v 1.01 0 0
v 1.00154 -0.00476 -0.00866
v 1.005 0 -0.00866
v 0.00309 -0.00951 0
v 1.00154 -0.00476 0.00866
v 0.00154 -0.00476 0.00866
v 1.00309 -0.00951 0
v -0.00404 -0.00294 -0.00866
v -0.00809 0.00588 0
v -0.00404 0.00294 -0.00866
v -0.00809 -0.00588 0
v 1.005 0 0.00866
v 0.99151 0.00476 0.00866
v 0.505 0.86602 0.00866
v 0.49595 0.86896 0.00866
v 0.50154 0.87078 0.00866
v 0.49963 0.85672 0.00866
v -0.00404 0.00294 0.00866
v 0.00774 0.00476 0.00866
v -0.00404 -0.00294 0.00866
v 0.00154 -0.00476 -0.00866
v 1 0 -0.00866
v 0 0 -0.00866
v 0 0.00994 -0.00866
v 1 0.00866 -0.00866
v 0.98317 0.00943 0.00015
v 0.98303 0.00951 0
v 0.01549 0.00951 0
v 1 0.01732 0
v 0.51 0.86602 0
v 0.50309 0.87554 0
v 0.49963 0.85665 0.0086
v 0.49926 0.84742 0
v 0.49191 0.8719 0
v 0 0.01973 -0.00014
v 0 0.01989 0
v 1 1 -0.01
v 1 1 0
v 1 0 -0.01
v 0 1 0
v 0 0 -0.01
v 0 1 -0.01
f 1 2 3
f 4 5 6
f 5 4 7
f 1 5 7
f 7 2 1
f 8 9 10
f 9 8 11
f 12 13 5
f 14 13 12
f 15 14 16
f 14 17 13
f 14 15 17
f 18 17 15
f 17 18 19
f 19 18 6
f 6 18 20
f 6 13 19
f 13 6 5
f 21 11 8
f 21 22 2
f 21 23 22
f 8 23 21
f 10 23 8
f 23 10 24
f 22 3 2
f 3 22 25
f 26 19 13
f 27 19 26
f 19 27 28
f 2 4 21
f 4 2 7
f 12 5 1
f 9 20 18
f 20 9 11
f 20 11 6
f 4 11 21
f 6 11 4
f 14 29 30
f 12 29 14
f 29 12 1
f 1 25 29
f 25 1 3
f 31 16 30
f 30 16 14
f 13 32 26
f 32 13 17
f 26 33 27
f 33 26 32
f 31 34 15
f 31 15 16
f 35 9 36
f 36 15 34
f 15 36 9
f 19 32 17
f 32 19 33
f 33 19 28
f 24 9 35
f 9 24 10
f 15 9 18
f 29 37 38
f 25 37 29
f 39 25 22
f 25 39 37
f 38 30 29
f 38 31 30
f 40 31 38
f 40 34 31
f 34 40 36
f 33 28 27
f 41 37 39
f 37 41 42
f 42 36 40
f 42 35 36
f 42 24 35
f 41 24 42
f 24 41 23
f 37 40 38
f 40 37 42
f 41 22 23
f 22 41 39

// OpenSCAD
hull(){
    translate([0.0, 0.0]) sphere(0.01);
    translate([1.0, 0.0]) sphere(0.01);
}
hull(){
    translate([1.0, 0.0]) sphere(0.01);
    translate([0.5, 0.8660254038]) sphere(0.01);
}
hull(){
    translate([0.5, 0.8660254038]) sphere(0.01);
    translate([0.0, 0.0]) sphere(0.01);
}
translate([0,0,-0.01]) color([0.1,0.1,0.1]) cube([1,1,0.01]);
